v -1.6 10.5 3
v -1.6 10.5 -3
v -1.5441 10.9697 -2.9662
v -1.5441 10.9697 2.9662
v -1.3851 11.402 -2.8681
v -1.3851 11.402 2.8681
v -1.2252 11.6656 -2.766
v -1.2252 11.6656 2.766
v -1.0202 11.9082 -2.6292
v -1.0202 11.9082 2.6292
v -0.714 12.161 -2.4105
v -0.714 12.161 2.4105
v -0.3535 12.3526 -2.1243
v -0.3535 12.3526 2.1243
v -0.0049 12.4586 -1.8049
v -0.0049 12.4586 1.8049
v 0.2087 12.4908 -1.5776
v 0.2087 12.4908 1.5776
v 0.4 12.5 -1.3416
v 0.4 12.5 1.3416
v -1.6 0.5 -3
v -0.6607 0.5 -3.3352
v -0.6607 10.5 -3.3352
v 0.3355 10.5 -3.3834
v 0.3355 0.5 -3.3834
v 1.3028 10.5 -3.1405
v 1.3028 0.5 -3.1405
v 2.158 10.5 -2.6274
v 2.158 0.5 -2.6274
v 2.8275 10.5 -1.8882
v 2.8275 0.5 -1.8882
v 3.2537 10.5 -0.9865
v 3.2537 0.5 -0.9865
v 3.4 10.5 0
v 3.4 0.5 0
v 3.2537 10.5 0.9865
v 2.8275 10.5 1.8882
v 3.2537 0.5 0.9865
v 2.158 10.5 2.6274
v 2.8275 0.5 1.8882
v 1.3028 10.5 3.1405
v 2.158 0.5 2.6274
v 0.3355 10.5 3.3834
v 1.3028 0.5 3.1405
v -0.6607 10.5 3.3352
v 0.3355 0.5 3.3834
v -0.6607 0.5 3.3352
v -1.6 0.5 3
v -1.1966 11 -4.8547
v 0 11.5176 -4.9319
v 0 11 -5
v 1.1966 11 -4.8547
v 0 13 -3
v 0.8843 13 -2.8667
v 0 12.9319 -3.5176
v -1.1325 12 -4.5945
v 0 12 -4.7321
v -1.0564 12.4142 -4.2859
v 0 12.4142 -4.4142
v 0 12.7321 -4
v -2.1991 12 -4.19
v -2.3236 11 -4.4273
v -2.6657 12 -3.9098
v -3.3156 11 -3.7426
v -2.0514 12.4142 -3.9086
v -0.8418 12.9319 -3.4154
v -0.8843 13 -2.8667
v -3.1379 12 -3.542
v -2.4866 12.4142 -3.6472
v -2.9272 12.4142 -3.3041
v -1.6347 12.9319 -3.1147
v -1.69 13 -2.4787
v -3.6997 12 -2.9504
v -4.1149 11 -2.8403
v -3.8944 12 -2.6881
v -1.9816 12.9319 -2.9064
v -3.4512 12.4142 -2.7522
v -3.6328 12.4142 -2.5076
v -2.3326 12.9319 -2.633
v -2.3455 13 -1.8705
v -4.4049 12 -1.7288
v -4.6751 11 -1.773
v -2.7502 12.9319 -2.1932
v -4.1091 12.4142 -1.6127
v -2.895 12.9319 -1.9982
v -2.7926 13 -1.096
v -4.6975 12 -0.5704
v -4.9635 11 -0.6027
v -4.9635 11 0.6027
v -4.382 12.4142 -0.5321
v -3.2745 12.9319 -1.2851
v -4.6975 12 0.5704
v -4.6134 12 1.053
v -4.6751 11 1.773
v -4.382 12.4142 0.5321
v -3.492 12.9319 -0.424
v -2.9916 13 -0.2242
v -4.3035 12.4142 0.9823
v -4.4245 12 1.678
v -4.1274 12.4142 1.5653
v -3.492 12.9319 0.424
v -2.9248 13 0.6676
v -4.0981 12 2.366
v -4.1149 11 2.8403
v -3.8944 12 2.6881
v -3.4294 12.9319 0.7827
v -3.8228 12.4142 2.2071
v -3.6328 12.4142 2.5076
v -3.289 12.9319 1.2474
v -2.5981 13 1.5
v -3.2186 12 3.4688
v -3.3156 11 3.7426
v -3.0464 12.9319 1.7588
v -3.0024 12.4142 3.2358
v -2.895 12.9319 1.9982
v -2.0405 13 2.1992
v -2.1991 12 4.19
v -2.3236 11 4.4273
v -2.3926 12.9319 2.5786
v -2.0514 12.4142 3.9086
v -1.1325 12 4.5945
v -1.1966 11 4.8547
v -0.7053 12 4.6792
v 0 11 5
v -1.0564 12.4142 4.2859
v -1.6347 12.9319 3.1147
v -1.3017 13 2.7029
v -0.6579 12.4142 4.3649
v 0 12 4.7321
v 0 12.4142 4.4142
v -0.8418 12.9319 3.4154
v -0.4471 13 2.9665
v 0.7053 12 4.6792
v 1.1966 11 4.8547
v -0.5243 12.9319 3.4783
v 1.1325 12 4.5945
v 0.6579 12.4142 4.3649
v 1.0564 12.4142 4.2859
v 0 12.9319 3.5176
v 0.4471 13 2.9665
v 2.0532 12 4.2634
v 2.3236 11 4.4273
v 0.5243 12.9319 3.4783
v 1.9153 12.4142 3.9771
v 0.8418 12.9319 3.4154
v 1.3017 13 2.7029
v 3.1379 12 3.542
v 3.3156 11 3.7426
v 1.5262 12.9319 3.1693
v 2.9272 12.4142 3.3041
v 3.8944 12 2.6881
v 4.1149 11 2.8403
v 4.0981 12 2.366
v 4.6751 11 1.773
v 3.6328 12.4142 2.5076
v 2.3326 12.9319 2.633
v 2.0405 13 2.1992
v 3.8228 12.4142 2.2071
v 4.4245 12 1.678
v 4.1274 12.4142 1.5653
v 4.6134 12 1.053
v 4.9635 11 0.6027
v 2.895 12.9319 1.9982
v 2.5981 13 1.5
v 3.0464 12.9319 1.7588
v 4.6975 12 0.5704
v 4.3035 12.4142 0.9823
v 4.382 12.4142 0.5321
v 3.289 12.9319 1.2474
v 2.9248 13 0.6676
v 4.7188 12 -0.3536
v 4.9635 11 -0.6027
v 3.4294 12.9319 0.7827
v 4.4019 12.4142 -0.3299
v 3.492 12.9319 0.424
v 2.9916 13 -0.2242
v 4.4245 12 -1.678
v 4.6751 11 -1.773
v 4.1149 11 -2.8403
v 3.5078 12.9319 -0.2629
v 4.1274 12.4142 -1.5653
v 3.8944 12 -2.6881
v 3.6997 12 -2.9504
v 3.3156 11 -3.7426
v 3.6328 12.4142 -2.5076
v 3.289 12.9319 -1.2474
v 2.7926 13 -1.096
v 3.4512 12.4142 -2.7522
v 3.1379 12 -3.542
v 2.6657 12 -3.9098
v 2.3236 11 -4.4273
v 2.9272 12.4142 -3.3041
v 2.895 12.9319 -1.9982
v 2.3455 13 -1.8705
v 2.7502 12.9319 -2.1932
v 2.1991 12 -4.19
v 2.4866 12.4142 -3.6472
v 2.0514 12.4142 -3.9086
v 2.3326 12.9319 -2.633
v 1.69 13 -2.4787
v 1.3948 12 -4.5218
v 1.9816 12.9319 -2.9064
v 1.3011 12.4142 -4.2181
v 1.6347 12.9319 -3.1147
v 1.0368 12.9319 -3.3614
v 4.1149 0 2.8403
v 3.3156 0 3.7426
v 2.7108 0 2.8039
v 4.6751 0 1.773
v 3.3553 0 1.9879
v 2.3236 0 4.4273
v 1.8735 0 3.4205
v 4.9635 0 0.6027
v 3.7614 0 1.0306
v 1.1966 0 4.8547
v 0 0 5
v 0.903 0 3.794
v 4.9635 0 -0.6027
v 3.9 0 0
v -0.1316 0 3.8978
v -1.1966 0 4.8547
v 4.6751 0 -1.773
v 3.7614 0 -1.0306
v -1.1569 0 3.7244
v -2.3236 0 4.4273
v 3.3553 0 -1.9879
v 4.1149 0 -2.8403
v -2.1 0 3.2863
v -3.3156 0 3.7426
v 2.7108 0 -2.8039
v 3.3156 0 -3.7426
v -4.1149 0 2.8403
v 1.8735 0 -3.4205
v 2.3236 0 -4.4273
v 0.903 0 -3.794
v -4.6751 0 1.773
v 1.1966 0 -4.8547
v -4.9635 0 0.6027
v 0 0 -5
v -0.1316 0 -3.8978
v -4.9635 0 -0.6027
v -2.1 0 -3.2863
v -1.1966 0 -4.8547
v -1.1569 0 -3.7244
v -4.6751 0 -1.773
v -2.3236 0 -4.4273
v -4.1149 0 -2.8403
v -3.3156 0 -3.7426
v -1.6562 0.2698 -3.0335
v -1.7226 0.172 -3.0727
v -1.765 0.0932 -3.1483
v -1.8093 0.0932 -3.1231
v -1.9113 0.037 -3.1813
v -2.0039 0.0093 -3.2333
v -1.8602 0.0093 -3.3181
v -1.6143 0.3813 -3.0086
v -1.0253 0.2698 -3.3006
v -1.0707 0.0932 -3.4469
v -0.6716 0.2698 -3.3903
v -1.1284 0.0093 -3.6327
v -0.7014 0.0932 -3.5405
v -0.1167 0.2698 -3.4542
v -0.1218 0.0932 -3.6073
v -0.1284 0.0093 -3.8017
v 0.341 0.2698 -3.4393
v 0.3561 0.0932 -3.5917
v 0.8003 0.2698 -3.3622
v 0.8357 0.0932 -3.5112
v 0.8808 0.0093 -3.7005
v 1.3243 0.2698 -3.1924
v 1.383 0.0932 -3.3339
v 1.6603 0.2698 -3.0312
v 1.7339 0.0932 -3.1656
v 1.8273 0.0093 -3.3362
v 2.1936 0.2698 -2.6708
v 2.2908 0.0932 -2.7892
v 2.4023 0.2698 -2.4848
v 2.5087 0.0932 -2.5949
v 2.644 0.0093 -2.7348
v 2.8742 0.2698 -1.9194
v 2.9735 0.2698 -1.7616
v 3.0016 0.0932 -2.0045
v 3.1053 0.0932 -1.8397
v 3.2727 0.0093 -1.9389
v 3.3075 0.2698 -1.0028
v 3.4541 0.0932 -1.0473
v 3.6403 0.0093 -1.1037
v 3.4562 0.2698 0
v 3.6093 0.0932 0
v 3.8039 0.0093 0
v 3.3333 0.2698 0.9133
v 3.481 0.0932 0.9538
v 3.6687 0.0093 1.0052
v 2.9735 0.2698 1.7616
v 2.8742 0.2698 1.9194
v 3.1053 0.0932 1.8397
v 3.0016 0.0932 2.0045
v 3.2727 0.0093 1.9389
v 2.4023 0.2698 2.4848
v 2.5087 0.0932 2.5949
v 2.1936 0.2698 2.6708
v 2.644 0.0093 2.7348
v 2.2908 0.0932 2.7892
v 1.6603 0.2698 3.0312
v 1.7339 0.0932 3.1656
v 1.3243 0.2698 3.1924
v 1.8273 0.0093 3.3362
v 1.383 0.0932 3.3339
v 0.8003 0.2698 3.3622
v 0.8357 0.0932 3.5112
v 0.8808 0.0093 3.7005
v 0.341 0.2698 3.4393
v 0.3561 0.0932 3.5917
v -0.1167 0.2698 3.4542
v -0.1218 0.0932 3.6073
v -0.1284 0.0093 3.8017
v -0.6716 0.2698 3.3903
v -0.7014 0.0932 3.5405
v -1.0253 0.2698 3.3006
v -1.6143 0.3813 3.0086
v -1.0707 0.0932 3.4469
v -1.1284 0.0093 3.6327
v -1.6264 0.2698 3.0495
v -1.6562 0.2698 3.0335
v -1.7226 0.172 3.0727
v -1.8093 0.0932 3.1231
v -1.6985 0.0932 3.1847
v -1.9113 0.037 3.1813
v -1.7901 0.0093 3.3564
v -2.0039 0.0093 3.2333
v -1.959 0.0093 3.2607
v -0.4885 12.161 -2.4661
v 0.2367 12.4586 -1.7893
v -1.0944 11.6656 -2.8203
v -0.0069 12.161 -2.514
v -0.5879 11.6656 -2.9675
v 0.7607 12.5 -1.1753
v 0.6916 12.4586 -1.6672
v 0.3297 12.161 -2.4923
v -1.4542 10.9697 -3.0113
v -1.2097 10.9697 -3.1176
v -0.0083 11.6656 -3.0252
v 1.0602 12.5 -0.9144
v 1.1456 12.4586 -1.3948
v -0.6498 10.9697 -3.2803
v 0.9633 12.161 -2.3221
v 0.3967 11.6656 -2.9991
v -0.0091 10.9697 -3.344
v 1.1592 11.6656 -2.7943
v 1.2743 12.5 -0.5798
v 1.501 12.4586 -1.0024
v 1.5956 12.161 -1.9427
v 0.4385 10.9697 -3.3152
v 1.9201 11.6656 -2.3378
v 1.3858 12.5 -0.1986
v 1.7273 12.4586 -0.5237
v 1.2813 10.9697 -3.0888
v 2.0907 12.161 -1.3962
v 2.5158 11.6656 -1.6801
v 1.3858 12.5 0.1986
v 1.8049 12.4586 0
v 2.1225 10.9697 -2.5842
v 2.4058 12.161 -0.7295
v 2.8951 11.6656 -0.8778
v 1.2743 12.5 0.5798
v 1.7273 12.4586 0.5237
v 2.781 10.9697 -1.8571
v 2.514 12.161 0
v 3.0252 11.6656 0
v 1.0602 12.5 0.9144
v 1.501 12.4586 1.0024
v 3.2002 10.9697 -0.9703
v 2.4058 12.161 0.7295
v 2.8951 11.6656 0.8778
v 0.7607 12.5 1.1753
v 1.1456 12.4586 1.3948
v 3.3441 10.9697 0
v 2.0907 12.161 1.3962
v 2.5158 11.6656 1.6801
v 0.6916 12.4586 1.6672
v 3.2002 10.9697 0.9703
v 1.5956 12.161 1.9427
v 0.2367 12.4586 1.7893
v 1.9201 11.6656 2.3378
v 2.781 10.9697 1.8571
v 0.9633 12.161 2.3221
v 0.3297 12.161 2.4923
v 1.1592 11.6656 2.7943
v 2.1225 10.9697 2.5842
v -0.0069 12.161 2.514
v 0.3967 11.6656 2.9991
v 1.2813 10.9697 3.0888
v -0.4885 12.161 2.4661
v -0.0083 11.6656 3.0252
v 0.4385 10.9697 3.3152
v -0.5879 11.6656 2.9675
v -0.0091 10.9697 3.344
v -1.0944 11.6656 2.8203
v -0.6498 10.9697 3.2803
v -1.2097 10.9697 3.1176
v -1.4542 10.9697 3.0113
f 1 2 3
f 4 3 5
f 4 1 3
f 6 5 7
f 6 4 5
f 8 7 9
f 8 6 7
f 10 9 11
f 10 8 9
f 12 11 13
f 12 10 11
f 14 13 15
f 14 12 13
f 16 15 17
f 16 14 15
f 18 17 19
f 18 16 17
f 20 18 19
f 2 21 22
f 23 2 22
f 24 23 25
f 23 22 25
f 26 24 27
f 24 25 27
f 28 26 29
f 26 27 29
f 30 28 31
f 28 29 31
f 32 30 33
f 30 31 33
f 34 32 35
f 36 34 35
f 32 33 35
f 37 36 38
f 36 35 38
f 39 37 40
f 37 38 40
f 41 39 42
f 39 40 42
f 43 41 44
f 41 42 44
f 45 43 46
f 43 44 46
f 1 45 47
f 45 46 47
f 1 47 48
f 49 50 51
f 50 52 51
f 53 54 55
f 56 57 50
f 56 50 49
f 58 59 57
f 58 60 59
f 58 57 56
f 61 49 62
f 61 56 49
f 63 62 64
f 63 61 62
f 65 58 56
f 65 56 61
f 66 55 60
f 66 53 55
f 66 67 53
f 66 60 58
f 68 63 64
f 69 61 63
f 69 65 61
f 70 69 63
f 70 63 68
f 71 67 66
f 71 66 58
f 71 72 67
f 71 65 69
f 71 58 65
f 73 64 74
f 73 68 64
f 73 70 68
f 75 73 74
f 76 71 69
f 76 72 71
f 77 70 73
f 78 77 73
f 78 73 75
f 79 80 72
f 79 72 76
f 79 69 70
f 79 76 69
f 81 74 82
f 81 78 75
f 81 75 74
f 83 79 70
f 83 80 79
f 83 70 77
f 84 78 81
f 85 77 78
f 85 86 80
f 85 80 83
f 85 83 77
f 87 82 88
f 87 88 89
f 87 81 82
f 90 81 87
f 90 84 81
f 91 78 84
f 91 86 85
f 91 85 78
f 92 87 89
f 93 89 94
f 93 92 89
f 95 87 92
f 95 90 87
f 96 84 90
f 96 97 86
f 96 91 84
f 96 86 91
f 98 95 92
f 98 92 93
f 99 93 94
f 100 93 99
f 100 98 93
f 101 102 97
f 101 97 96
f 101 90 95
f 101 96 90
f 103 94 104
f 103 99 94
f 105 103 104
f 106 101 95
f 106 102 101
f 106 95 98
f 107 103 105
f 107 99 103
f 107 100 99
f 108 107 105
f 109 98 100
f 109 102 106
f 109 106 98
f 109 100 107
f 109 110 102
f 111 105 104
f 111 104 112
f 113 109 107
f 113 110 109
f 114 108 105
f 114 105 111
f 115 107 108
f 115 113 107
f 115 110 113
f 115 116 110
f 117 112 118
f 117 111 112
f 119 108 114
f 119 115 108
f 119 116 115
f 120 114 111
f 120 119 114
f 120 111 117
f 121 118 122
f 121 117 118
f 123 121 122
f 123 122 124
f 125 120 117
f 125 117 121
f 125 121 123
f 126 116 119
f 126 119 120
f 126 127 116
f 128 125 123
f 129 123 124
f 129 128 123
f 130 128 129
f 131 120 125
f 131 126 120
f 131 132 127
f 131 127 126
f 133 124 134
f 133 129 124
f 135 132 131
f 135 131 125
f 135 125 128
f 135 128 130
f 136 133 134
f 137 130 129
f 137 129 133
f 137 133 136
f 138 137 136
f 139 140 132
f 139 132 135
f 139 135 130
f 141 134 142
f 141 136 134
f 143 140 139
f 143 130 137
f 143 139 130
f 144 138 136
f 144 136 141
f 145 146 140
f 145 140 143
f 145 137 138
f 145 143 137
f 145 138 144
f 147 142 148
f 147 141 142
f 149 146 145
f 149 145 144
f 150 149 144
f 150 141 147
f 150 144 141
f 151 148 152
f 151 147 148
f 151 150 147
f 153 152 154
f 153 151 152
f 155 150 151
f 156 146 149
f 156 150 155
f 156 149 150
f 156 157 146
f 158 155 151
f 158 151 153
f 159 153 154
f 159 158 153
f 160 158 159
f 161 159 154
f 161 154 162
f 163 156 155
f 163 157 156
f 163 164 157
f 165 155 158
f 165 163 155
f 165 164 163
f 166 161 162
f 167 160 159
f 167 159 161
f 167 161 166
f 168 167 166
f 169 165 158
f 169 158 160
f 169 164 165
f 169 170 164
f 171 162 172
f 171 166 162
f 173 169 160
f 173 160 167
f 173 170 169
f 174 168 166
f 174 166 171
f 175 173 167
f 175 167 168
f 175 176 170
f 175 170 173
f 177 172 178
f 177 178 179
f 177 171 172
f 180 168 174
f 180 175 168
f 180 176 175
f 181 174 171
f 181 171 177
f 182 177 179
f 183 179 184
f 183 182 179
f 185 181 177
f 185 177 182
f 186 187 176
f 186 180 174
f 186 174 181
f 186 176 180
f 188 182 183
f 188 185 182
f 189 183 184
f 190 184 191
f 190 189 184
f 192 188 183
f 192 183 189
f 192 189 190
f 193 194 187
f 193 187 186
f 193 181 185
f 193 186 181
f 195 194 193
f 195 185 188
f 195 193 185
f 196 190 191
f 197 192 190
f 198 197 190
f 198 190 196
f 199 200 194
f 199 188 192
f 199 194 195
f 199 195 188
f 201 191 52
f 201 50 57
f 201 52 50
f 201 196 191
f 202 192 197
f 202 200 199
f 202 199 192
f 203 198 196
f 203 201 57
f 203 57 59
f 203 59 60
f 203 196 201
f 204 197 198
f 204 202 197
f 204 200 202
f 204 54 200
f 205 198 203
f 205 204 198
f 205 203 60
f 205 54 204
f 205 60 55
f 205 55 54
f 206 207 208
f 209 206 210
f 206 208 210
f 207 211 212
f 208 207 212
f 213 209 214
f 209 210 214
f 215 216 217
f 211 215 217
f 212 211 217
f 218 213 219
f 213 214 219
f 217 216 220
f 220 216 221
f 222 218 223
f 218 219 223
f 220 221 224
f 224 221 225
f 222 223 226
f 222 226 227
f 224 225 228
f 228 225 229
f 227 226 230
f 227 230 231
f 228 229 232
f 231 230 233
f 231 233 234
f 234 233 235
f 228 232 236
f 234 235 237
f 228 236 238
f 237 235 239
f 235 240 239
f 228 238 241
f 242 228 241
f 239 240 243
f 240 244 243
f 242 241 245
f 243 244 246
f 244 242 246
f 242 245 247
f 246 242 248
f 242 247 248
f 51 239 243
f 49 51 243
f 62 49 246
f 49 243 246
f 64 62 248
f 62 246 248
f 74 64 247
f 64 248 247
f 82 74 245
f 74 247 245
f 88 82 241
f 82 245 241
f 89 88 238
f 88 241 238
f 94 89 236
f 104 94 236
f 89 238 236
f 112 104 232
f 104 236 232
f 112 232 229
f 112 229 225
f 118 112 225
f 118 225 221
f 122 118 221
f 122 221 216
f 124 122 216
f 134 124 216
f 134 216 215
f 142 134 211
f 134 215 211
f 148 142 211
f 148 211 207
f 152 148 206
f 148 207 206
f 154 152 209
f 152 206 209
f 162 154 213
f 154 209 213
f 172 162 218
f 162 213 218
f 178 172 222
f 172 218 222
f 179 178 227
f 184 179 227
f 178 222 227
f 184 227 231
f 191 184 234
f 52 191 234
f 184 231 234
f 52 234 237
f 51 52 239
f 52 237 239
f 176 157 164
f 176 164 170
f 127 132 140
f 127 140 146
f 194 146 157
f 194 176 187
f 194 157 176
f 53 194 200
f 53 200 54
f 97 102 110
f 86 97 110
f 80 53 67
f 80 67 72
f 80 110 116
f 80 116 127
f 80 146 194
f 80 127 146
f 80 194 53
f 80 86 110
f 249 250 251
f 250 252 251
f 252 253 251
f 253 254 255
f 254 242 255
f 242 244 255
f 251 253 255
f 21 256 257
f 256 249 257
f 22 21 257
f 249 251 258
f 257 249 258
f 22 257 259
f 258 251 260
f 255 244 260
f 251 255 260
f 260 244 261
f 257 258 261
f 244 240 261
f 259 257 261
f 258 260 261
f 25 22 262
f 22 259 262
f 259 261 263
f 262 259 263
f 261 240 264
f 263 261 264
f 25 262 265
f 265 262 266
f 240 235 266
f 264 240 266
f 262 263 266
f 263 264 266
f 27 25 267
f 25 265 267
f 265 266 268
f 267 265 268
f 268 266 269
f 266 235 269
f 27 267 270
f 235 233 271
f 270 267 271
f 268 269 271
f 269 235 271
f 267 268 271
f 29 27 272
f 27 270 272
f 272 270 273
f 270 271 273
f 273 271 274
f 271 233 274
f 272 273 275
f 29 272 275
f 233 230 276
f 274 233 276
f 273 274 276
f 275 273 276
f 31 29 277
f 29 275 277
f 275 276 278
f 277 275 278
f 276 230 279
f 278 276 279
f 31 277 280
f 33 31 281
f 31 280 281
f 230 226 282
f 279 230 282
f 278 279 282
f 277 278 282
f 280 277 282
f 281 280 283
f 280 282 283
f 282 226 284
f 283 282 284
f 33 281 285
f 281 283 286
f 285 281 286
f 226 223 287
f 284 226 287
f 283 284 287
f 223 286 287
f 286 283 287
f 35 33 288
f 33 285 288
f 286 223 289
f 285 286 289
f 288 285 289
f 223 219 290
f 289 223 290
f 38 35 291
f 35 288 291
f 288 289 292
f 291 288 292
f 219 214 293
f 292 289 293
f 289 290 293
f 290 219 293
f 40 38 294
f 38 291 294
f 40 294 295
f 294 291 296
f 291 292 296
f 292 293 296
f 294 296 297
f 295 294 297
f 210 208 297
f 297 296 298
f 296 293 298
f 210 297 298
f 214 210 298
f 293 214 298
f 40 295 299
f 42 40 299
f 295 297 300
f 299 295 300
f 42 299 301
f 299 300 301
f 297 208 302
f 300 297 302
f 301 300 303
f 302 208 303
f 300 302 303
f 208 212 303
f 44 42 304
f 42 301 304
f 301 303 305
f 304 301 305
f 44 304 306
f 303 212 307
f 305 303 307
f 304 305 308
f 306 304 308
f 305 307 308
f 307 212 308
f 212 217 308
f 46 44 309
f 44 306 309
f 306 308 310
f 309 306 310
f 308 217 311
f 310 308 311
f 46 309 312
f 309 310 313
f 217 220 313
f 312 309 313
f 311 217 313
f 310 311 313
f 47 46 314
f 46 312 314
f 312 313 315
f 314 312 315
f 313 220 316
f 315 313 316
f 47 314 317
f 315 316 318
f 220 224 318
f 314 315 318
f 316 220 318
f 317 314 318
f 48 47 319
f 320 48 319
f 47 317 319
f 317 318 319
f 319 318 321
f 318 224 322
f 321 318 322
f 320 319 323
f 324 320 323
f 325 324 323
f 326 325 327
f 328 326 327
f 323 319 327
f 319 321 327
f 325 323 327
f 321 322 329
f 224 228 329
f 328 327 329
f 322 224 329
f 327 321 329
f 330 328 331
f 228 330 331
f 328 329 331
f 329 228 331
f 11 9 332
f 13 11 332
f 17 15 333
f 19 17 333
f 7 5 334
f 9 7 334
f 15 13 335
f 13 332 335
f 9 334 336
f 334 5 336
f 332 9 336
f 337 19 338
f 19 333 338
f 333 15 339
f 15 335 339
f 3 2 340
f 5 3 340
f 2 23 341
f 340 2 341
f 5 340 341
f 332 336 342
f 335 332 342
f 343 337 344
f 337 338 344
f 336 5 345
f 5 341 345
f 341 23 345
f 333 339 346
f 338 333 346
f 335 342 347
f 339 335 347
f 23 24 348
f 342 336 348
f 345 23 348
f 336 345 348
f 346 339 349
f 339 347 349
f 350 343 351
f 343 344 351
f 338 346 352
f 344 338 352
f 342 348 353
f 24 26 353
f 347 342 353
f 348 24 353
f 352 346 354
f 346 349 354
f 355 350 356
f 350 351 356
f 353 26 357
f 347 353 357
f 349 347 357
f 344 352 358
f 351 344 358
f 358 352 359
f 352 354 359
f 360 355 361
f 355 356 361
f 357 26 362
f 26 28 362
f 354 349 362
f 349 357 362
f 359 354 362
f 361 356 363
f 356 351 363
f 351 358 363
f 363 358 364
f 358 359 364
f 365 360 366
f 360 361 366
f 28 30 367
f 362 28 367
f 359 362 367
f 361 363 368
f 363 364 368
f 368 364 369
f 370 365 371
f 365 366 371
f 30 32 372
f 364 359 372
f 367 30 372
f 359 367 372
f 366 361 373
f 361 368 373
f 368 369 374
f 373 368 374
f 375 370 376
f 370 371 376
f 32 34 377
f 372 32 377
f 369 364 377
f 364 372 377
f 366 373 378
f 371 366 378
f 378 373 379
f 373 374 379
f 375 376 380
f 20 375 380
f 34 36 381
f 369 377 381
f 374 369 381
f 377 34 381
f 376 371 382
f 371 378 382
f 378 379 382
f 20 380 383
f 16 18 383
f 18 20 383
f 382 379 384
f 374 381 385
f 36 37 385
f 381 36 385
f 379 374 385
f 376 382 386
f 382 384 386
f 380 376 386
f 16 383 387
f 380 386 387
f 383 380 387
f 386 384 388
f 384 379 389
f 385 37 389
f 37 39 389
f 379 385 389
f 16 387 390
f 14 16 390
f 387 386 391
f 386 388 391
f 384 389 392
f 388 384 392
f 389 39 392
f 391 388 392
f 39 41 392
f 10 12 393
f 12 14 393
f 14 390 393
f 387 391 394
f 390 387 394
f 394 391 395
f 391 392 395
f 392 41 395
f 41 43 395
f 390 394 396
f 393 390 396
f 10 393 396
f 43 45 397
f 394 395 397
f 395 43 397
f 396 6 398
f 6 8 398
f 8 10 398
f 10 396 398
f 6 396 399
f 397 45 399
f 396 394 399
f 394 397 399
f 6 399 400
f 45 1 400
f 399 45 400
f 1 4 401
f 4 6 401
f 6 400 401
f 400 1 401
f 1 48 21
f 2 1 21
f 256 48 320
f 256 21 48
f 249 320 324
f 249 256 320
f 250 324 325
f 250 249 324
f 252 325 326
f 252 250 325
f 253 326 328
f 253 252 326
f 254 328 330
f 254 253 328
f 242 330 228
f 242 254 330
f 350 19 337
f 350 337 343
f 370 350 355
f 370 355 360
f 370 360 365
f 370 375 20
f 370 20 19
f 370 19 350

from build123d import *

# Parameters (mm, degrees)
SKETCH1_R           = 5
BOSS_EXTRUDE1_DEPTH = 13
CUT_EXTRUDE1_DEPTH  = 12.5
FILLET4_R           = 2
FILLET5_R           = 0.5
ROUND_BODY_R        = 2


with BuildPart() as part:
    # Sketch1 → Boss-Extrude1 (new body)
    with BuildSketch(Plane(origin=(0, 0, 0), x_dir=(1, 0, 0), z_dir=(0, 1, 0))):
        with Locations(Location((0, 0, 0), (0, 0, 90))):
            Circle(SKETCH1_R)
    extrude(amount=BOSS_EXTRUDE1_DEPTH)

    # Insert → Cut-Extrude1 (cut)
    with BuildSketch(Plane.XZ):
        with BuildLine():
            Line((-1.6, 3), (-1.6, -3))
            ThreePointArc((-1.6, -3), (3.4, 0), (-1.6, 3))
        make_face()
    extrude(amount=-CUT_EXTRUDE1_DEPTH, mode=Mode.SUBTRACT)

    # Fillet4
    # the kernel refuses this fillet: 2 mm, written as the material it adds along each edge
    with BuildSketch(Plane(origin=(0, 12.5, 0), x_dir=(-0.9999950652018581, 0, -0.003141587485880304), z_dir=(-0.003141587485880304, 0, 0.9999950652018581))) as fillet4_piece_1:
        with BuildLine():
            CenterArc((3.4 - FILLET4_R, FILLET4_R), FILLET4_R, 270, 90)
            Line((3.4 - FILLET4_R, 0), (3.4, 0))
            Line((3.4, 0), (3.4, FILLET4_R))
        make_face()
    revolve(axis=Axis((0, 12.5, 0), (0, -1, 0)), revolution_arc=359.64)
    with BuildSketch(Plane(origin=(-1.6, 12.5, 8), x_dir=(0, -1, 0), z_dir=(0, 0, -1))) as fillet4_piece_2_section:
        with BuildLine():
            CenterArc((FILLET4_R, -FILLET4_R), FILLET4_R, 90, 90)
            Line((0, -FILLET4_R), (0, 0))
            Line((0, 0), (FILLET4_R, 0))
        make_face()
    fillet4_piece_2 = extrude(amount=16, mode=Mode.PRIVATE)
    fillet4_piece_2 = fillet4_piece_2 & Plane(origin=(0, 12.061767945, 0), x_dir=(-0.4705882352941176, 0, -0.8823529411764707), z_dir=(0, -1, 0)) * Cylinder(3.4, 40, mode=Mode.PRIVATE)
    add(fillet4_piece_2)

    # Fillet5
    fillet5_edges = [part.edges().sort_by_distance(p)[0] for p in [
        (3.4, 0, 0),
        (-1.6, 0, 0),
    ]]
    fillet(fillet5_edges, radius=FILLET5_R)

    # Round Body
    round_body_edges = [part.edges().sort_by_distance(p)[0] for p in [
        (0, 13, 5),
    ]]
    fillet(round_body_edges, radius=ROUND_BODY_R)


solid = part.part
